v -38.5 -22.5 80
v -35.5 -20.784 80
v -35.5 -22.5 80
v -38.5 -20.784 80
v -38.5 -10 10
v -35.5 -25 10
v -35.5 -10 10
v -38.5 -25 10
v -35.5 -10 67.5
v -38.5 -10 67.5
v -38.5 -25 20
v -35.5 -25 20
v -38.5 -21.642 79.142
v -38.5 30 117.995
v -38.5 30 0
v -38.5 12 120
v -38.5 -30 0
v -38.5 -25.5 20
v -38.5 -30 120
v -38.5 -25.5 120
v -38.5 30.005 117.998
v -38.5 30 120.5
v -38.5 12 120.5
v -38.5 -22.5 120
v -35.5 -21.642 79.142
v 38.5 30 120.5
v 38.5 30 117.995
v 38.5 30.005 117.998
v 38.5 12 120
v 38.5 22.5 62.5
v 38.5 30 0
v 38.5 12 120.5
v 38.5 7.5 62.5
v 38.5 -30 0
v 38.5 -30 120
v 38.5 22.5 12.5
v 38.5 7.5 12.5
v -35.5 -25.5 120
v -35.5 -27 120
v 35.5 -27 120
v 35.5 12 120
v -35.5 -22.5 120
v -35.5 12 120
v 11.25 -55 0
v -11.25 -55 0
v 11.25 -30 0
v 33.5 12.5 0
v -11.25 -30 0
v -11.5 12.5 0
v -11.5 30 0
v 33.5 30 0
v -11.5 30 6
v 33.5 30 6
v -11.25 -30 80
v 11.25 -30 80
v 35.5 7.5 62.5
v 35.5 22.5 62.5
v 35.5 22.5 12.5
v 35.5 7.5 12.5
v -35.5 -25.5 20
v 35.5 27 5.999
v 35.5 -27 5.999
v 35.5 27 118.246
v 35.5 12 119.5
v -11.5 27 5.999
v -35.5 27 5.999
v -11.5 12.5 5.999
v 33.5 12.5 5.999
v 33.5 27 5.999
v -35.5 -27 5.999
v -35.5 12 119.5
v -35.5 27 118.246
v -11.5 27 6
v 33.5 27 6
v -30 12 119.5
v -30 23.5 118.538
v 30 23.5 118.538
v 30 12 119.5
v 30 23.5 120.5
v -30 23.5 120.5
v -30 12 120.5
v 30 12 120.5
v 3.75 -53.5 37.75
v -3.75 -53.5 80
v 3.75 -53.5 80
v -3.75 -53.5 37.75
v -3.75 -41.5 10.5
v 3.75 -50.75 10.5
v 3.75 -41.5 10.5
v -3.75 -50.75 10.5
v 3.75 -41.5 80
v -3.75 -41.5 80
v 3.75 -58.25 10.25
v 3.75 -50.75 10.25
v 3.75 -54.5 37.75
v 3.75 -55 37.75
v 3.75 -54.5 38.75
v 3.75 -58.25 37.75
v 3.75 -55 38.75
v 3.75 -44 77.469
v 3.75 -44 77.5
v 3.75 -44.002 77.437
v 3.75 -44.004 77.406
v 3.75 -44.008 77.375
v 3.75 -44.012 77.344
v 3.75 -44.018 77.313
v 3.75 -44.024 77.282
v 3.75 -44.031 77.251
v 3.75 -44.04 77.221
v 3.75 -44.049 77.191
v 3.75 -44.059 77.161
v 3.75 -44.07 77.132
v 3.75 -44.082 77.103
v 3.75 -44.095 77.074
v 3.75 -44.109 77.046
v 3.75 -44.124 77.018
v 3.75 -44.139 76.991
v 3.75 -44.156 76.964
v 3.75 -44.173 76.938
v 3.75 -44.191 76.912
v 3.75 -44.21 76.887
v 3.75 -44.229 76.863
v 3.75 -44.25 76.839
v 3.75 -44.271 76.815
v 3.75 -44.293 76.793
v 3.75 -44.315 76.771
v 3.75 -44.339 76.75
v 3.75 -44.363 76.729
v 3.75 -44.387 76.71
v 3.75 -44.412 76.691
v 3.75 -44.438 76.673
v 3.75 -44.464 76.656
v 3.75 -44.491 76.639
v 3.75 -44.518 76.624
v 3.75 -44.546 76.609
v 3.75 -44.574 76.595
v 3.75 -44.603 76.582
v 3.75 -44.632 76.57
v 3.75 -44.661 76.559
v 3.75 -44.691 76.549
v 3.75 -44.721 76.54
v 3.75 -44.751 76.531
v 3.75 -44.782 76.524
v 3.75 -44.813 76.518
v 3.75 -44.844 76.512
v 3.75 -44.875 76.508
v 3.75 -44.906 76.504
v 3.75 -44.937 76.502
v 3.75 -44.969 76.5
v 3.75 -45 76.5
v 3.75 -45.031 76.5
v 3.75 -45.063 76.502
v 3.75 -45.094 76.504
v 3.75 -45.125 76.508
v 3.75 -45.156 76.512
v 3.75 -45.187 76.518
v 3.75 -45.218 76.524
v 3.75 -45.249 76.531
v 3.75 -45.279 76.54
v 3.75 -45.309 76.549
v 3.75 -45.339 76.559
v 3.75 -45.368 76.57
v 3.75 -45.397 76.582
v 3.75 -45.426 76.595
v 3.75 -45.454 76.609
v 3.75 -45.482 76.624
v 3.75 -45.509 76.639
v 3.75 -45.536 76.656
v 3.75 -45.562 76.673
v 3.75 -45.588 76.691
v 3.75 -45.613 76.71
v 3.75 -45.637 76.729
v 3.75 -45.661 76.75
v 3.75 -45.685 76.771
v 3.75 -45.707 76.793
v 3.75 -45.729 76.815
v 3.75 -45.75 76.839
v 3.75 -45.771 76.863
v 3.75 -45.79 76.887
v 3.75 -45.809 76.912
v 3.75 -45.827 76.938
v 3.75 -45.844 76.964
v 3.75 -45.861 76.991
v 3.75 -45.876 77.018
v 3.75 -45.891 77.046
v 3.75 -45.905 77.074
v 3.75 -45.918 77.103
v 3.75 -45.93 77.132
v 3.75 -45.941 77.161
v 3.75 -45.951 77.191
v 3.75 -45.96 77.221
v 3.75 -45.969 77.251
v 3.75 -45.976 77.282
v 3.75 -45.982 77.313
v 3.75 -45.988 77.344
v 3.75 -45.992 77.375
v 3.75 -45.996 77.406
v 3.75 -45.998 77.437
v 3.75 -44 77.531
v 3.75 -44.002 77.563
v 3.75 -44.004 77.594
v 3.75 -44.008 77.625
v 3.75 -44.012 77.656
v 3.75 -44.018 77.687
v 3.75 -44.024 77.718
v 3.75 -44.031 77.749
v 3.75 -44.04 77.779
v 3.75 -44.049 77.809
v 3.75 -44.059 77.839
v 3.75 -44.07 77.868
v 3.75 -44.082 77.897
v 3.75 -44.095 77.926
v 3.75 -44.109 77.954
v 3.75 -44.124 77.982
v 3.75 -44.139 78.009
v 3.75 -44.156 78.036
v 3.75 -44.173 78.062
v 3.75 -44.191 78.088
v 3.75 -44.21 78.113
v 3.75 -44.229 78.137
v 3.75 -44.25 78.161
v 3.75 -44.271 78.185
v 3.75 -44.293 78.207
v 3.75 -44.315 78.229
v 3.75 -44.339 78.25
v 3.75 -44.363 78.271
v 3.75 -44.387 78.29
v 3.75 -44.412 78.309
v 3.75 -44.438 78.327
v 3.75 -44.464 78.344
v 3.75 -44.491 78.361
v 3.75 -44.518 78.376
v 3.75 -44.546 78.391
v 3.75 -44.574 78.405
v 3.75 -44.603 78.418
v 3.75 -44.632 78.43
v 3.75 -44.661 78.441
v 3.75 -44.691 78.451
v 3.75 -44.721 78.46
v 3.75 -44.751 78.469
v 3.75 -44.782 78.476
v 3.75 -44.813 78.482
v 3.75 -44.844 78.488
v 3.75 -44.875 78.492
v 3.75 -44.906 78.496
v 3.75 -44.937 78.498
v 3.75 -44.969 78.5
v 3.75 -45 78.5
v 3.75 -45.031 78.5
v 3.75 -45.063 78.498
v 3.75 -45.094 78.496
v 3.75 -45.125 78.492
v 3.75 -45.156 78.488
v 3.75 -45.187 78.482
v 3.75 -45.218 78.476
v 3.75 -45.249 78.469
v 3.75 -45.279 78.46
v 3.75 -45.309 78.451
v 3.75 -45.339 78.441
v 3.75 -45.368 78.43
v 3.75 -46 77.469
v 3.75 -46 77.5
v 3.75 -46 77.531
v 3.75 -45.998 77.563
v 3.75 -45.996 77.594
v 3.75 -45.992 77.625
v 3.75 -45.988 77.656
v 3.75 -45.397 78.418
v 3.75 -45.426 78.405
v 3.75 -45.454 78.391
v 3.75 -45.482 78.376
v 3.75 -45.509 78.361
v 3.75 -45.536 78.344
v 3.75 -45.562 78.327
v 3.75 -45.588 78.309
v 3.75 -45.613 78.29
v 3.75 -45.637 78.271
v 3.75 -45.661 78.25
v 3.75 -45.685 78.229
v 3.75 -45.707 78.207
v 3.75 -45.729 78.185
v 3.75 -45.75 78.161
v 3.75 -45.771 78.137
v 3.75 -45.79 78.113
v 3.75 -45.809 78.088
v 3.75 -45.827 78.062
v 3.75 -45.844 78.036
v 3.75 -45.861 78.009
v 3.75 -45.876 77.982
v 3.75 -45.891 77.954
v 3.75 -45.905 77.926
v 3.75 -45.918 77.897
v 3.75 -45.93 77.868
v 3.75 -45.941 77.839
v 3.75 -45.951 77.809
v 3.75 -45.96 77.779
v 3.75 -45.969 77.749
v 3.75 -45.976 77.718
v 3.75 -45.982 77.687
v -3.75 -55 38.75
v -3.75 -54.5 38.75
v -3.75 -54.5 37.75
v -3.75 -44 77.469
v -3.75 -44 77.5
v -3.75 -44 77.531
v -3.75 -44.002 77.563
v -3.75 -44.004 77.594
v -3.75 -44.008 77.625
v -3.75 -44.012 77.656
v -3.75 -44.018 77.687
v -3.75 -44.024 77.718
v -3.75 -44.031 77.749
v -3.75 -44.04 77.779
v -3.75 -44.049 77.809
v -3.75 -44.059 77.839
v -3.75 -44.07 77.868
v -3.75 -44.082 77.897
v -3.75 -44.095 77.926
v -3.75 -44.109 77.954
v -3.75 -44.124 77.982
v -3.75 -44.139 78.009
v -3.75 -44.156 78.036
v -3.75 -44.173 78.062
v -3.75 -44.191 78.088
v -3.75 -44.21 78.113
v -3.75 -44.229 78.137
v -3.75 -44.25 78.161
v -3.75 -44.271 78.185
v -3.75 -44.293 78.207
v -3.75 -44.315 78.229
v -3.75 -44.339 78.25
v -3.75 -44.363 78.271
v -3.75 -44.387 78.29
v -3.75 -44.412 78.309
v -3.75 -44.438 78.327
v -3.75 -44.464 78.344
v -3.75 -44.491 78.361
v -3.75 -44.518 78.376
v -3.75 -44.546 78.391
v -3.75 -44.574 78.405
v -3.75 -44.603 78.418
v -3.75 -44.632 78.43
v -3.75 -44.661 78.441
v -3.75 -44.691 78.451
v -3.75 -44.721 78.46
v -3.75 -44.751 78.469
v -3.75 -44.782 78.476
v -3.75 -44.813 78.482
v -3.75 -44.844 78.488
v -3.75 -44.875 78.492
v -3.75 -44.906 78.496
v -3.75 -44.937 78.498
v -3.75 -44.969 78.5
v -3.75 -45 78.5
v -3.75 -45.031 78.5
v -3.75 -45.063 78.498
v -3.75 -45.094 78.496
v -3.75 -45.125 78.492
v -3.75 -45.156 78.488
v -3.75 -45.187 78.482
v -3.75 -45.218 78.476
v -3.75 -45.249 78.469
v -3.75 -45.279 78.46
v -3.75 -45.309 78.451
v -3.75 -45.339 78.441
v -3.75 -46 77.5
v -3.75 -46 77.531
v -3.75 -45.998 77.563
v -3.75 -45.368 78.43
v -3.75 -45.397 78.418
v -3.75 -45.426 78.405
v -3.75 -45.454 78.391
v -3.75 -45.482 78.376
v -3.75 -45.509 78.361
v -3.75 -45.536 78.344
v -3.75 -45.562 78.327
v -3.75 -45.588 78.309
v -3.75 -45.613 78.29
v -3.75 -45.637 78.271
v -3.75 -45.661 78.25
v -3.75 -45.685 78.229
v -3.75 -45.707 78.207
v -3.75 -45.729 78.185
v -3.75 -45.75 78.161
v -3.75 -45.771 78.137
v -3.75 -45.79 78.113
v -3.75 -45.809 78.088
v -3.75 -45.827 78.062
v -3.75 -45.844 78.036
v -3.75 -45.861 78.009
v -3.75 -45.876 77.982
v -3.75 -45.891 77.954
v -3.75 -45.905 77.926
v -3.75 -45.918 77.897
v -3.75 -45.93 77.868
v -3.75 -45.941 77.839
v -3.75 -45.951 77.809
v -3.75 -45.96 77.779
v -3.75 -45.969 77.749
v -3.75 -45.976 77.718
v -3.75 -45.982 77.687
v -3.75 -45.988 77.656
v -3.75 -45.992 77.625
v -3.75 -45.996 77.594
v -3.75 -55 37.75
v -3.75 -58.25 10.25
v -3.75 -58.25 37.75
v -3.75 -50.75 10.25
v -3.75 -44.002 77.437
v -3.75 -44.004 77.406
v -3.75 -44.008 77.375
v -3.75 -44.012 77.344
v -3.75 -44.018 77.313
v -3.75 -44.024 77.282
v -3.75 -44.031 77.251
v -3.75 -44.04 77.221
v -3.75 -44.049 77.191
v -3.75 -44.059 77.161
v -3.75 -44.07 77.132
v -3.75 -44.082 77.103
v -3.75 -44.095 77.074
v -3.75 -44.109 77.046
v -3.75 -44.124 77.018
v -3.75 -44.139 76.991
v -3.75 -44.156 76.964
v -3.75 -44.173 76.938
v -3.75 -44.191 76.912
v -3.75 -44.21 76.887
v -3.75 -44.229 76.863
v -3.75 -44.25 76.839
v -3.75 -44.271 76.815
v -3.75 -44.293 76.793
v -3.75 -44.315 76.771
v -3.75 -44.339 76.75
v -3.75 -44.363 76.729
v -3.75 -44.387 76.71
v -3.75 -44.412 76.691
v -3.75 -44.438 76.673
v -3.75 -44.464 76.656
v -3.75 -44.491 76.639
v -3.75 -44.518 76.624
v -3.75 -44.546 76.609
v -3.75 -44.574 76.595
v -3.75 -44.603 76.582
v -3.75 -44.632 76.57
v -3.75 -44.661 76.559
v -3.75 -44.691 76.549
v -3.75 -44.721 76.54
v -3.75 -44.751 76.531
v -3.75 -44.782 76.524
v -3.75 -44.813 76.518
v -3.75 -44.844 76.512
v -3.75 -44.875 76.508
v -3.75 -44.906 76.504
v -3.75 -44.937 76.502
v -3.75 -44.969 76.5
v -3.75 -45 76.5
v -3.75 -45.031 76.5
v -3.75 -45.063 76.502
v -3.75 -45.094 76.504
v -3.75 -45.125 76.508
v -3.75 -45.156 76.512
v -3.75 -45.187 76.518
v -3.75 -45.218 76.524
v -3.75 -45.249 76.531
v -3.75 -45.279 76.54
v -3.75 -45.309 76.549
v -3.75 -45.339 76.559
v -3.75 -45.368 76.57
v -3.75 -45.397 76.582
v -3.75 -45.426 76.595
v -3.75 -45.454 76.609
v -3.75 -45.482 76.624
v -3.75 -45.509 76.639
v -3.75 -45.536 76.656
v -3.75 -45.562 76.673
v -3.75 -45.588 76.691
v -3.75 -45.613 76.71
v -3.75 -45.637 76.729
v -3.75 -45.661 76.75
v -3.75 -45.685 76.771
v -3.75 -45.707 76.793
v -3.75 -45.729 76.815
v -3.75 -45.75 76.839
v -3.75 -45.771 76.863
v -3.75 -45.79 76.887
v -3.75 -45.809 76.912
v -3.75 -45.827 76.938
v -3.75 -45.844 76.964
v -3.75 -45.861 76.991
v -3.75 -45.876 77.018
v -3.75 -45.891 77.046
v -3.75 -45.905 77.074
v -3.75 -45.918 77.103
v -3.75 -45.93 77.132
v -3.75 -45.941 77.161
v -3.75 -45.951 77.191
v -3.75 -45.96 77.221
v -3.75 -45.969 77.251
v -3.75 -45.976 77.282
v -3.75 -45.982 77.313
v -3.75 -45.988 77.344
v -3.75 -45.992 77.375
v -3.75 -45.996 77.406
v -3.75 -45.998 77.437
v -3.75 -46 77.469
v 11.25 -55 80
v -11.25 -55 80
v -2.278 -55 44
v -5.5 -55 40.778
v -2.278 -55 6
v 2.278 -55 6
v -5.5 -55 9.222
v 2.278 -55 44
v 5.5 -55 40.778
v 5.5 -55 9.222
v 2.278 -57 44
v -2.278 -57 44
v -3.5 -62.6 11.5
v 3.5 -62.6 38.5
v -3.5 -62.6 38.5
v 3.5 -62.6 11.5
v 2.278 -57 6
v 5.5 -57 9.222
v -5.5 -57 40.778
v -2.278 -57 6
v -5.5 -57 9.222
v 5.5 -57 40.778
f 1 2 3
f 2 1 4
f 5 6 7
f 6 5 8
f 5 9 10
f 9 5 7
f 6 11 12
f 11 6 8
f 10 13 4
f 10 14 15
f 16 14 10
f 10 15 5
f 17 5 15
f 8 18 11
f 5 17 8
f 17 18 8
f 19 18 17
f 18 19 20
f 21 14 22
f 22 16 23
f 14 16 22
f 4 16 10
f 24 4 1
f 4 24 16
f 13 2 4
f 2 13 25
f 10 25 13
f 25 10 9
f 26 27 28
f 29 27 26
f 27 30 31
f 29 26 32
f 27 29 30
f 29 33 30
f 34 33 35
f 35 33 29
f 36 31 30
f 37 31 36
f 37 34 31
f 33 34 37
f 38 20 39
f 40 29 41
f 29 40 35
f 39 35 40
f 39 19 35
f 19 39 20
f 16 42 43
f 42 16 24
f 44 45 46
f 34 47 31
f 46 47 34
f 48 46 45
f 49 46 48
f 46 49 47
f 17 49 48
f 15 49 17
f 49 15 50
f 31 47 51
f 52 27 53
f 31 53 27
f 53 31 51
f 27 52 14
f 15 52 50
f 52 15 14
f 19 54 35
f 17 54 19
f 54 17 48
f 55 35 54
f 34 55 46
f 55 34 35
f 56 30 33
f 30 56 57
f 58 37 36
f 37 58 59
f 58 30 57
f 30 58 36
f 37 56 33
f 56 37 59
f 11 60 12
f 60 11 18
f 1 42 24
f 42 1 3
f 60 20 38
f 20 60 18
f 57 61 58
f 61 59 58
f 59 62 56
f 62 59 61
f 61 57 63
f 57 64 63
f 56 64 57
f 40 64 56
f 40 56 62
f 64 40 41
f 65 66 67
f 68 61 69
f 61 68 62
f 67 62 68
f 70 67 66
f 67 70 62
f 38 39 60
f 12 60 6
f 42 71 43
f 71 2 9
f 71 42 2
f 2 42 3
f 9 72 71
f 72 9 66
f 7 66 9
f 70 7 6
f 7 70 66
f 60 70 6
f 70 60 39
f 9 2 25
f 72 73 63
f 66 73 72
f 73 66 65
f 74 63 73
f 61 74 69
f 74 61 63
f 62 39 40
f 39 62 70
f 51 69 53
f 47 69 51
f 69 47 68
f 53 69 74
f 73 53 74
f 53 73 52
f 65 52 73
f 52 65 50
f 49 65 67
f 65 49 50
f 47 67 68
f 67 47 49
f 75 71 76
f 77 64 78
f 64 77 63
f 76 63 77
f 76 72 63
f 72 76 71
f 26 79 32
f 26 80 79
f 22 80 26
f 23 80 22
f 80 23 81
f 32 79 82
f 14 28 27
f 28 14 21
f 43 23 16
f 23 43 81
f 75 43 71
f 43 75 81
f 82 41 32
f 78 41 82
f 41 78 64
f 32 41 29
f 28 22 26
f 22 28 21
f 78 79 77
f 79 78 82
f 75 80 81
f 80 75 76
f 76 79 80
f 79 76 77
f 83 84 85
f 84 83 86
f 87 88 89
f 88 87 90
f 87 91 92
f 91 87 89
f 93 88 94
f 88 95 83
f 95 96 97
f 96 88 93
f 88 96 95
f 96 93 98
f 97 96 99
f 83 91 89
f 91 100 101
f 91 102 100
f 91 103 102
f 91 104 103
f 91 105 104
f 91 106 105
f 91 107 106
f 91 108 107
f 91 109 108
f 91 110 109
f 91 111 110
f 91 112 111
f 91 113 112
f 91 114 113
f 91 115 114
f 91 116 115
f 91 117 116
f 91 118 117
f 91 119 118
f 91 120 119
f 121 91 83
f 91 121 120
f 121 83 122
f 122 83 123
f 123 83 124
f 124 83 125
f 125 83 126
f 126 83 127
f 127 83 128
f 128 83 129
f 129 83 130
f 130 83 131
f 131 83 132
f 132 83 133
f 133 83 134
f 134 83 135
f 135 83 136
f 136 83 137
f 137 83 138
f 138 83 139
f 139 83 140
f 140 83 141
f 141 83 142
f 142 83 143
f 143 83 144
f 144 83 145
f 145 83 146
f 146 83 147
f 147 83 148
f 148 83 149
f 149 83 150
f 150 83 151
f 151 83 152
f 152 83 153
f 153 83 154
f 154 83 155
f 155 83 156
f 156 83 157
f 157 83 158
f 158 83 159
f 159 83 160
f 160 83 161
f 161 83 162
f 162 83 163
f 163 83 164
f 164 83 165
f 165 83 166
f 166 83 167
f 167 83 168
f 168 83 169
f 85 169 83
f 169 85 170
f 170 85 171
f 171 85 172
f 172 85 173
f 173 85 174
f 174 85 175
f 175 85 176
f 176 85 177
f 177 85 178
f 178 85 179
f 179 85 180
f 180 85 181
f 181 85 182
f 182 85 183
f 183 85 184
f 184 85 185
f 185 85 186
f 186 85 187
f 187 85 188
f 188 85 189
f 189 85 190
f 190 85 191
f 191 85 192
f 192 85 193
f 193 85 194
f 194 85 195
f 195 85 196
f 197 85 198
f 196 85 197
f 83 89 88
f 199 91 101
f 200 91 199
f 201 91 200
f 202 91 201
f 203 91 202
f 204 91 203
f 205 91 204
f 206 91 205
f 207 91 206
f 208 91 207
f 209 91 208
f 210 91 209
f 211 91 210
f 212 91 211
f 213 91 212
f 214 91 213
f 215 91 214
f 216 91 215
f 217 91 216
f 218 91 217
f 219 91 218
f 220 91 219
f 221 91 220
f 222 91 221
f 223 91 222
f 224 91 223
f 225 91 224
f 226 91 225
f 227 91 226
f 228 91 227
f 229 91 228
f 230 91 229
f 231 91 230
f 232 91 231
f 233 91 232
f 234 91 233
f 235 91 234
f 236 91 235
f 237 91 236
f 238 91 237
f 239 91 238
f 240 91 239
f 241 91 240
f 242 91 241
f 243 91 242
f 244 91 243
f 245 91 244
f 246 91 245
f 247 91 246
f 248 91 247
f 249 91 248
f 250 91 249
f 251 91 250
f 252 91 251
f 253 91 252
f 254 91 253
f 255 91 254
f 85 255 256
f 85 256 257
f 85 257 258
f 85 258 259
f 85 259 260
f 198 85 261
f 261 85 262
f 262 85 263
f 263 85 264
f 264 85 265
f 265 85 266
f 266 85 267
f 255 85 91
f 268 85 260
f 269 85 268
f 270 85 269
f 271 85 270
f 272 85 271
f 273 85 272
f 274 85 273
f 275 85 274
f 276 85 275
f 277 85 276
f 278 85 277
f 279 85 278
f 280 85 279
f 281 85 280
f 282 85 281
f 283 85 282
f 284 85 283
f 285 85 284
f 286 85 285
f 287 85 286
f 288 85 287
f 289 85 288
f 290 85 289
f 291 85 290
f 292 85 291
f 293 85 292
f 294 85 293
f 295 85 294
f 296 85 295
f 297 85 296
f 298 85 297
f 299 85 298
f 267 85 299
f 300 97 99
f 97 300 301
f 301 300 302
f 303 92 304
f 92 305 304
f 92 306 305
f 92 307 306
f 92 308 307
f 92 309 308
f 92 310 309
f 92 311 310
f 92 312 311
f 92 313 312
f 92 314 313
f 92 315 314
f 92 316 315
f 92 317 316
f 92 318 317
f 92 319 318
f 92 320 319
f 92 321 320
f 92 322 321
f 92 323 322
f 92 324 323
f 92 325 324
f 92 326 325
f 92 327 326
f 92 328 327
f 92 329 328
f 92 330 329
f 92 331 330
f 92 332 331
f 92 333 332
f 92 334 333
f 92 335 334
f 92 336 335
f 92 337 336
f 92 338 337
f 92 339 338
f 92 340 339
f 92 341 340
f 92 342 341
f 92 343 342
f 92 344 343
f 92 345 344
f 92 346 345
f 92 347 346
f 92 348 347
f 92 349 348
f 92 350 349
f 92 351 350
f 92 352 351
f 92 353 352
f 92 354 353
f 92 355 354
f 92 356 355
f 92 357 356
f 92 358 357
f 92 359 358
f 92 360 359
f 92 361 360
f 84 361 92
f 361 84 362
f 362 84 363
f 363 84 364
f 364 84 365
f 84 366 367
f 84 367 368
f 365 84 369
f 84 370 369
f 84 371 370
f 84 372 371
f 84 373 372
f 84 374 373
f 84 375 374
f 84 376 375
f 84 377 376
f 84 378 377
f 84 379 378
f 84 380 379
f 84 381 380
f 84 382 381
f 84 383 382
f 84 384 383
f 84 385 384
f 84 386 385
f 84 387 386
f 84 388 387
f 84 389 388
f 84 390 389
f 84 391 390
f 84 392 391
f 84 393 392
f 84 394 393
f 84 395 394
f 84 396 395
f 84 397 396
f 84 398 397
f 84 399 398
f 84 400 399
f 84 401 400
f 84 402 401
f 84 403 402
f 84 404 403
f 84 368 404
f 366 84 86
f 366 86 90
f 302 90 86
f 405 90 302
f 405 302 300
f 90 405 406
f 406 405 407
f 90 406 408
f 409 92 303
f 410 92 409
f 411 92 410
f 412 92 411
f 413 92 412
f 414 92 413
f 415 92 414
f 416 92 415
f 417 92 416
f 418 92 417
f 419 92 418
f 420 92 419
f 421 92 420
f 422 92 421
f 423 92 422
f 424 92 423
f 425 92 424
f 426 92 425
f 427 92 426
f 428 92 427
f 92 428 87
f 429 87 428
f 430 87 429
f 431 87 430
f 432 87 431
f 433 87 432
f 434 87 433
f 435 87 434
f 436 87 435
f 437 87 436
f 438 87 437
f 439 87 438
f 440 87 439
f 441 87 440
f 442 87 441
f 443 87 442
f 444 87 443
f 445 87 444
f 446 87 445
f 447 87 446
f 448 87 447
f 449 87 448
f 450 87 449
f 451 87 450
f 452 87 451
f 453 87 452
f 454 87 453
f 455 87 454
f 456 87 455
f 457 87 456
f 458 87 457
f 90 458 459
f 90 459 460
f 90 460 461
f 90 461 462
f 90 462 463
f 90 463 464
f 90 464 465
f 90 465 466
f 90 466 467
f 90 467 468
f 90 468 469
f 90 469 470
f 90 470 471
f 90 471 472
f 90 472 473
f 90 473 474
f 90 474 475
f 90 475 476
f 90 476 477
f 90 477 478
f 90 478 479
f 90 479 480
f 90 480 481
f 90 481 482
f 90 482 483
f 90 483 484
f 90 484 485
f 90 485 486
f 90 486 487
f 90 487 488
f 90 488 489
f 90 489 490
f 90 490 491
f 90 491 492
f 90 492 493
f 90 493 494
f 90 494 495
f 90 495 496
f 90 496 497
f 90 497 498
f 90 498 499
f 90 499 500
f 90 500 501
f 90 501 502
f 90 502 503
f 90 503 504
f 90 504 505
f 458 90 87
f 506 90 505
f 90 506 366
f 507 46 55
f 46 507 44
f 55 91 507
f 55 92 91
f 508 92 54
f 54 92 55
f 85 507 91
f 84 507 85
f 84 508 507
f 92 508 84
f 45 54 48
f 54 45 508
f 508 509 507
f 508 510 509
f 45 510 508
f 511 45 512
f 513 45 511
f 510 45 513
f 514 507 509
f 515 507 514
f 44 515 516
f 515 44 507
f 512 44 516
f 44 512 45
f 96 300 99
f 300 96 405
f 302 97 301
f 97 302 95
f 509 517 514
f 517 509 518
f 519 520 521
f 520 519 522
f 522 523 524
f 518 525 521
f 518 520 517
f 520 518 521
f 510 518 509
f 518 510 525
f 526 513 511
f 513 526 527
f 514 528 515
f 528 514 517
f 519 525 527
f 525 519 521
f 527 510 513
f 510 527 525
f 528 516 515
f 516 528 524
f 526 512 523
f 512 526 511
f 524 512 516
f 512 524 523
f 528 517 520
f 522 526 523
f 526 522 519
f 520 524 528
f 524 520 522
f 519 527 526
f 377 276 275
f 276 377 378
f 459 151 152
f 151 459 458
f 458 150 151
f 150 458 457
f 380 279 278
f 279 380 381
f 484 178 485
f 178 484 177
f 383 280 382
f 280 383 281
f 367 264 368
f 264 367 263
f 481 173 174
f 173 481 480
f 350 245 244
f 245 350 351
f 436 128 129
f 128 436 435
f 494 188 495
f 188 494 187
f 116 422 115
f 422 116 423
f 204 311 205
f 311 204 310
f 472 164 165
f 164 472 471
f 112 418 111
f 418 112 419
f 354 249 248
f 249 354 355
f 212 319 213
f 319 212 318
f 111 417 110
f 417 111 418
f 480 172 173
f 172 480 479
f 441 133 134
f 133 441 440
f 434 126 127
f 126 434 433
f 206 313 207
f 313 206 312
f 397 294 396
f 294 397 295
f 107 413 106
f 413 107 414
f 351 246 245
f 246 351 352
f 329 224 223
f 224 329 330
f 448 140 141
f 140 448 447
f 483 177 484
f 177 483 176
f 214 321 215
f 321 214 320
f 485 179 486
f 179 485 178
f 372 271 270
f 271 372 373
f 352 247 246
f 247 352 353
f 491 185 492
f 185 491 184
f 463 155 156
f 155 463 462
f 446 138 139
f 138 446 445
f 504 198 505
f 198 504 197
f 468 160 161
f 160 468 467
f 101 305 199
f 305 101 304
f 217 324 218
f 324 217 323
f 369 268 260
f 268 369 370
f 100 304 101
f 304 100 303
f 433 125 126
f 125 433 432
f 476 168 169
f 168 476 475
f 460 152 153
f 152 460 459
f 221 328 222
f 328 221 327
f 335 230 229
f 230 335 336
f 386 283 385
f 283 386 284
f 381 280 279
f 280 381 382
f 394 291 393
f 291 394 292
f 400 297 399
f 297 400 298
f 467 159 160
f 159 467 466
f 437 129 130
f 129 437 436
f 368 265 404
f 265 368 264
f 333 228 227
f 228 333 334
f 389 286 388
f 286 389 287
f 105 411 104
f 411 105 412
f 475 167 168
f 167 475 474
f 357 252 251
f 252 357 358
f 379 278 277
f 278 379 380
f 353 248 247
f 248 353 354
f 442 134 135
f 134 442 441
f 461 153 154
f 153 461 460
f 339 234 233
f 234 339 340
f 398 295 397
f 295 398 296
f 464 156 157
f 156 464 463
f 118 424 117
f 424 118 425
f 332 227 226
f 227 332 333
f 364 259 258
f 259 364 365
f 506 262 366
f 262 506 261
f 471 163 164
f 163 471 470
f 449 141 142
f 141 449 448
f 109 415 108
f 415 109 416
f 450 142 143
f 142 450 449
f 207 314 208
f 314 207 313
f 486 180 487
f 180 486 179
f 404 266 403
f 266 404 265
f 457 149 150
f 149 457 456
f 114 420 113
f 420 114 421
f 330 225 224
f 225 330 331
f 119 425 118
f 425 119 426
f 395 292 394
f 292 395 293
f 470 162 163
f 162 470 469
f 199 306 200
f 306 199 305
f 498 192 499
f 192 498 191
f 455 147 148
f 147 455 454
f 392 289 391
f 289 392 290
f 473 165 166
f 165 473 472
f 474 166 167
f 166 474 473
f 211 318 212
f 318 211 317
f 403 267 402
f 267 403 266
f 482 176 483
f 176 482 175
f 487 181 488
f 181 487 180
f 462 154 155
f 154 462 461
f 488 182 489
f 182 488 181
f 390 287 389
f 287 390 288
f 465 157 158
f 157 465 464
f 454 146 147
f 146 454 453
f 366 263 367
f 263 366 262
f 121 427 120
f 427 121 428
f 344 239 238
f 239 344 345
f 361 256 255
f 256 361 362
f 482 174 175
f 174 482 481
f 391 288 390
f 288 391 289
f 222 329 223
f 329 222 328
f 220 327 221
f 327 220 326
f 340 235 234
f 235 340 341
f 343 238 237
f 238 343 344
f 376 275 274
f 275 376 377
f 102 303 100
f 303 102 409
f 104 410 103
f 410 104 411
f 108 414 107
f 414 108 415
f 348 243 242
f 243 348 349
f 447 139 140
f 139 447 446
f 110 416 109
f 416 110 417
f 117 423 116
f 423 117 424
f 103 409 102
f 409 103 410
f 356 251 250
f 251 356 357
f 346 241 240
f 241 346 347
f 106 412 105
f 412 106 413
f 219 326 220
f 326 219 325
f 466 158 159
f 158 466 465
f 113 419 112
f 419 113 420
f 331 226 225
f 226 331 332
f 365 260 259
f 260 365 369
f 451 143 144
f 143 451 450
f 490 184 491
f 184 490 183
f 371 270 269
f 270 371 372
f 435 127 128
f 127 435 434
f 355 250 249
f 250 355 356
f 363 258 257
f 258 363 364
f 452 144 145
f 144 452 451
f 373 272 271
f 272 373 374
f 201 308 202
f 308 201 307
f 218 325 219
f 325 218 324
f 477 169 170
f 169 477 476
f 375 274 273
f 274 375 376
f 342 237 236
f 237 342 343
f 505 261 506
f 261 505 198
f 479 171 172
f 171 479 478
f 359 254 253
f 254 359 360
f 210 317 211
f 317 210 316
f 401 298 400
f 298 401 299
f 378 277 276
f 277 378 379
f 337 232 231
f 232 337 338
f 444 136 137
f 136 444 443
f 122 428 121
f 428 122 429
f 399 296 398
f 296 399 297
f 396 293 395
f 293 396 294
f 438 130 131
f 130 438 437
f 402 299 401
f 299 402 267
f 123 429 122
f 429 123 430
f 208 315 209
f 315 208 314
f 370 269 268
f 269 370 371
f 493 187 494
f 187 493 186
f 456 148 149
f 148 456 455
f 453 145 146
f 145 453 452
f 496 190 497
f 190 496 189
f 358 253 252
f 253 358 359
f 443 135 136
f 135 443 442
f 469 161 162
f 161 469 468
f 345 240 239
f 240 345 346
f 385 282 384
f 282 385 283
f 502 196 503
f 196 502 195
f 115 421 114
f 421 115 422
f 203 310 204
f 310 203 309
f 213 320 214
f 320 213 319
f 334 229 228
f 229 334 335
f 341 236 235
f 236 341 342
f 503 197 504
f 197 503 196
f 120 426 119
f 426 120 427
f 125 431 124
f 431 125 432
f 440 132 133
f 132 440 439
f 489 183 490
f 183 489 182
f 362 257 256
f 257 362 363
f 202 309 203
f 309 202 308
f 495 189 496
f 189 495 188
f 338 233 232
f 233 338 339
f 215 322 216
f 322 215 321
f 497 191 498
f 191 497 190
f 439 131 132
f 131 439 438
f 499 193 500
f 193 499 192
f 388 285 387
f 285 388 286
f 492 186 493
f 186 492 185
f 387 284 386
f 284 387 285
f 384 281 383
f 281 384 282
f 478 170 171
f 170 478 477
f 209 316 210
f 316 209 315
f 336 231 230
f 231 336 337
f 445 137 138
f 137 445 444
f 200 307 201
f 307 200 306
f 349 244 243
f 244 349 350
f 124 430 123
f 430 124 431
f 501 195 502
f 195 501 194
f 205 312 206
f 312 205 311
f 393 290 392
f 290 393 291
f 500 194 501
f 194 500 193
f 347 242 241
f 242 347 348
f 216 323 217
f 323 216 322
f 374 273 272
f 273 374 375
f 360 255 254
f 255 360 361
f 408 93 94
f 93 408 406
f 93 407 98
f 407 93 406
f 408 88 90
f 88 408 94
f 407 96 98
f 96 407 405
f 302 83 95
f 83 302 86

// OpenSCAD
// file: notched_attachment.scad
/*
//does not go to 116 or higher
sb_hight = 80; 
//dont make this longer its a waist of filament.:
sb_width = 40;
sb_length = 55;*/

notch_mating_gap = 0.0;

notch_rim_radius = 5.5 + notch_mating_gap;
notch_rim_height = 2 + notch_mating_gap;

notch_tip_length = 27 + notch_mating_gap;
notch_tip_width = 7 + notch_mating_gap;
notch_tip_height = 7.6 + notch_mating_gap;

magnet_length = 27.5;
magnet_width = 7.5;
magnet_hight = magnet_width;

module female_atachment_notch(sb_hight = 80,sb_width = 40,sb_length = 55) {
  hull(){
    translate([notch_tip_length/2, 0, notch_rim_height/2]) rotate([0, 0, 360/16])
      cylinder(h = notch_rim_height, r = notch_rim_radius / cos(360/16), $fn = 8, center = true);
    translate([notch_tip_length/-2, 0, notch_rim_height/2]) rotate([0, 0, 360/16])
      cylinder(h = notch_rim_height, r = notch_rim_radius / cos(360/16), $fn = 8, center = true);
    translate([0, 0, notch_tip_height/2])
      cube([notch_tip_length, notch_tip_width, notch_tip_height], center = true);
  }
}

module magnet(){
    cube([magnet_length,magnet_width,magnet_hight],center = true);
}

module spacing_box (sb_hight = 80,sb_width = 40,sb_length = 55
){

    
    difference(){
        translate([0,0,sb_hight/2])
            cube([sb_length,
                  sb_width,
                  sb_hight],center = true);
    union(){
        translate([0,-40,30])
           rotate([0,90,270])
               translate([-15,0,magnet_hight-2])
                   magnet();
        
        translate([0,-sb_width/2 + magnet_width*2 -2, sb_hight/10 +25])
             rotate([0,0,270])
                 translate([5.5,0,magnet_hight+10])
        
                     cube([magnet_width*2 -3,magnet_width+2,sb_hight ],center = true);
            
        translate([0,-sb_width/2 +2,25])
            cube([magnet_hight,magnet_width,magnet_length], center = true);
        
        }
    }
}




module atachment_notch(sb_hight = 80,sb_width = 40,sb_length = 55, 
) {
  difference(){
      union(){
      translate([sb_hight/2-20,0,-7])  
          rotate([-90,0,90])  
              spacing_box(sb_hight,sb_width,sb_length);
        
          hull(){
            translate([sb_hight/2 - 45,0,sb_width/2 - 7]){
              translate([notch_tip_length/2, 0, notch_rim_height/2]) rotate([0, 0, 360/16])
                cylinder(h = notch_rim_height, r = notch_rim_radius / cos(360/16), $fn = 8, center = true);
              translate([notch_tip_length/-2, 0, notch_rim_height/2]) rotate([0, 0, 360/16])
                cylinder(h = notch_rim_height, r = notch_rim_radius / cos(360/16), $fn = 8, center = true);
              translate([0, 0, notch_tip_height/2])
                cube([notch_tip_length, notch_tip_width, notch_tip_height], center = true);
                
            }
        }
     
            translate([-sb_hight/2 - 17.5,4.5,sb_width/2 - 17])
                rotate([90,0,0])
                    cylinder(r=1 , h= 9 , $fn = 200);
        
        difference(){
        
            
        
          translate([-20,0,sb_width/2 - 15])
            cube([sb_hight,magnet_width+2,magnet_hight*2],center = true);
        
          translate([0,-0,sb_width/2 - 16])
            cube([magnet_length*300,magnet_width,magnet_hight*2],center = true);
        
        }
        }
translate([sb_width/2-16.5,0,sb_width/2-7.5])
            cube([magnet_length,magnet_width,magnet_hight], center = true);
}
}

/*
atachment_notch (sb_hight = 90,sb_width = 33,sb_length = 55);
//*/
// main file
include<notched_attachment.scad>;

pi_box_hight = 120; 
pi_box_width = 60;
pi_box_length = 77;
//does not go to 116 or higher
spacer_box_hight = 80; 
//dont make this longer its a waist of filament.scad:
spacer_box_width = 25;
spacer_box_length = 22.5;

usb_cutout_hight = 50;
usb_cutout_width = 15;
usb_cutout_length = 55;

wall_width = 3;

floor_hight = 6;


module pi_box (){
    difference(){
      union(){
        translate([0,0,pi_box_hight/2])
          cube([pi_box_length,pi_box_width,pi_box_hight],center = true);
      

    }
      translate([pi_box_length/2,15,37.5])
        cube([usb_cutout_length,usb_cutout_width,usb_cutout_hight],center = true);
      
      translate([0,-pi_box_width/2 + 32.5,0])
      union(){
      difference(){    
      translate([-pi_box_length/2 ,-pi_box_width/2 + pi_box_width/2 - 20,45])
        cube([usb_cutout_length,usb_cutout_width,usb_cutout_hight+20],center = true);
          
      translate([-pi_box_length/2,-pi_box_width/2 + pi_box_width/2 - 10,65])
      rotate([45,0,0])
      cube([20,40,20]);
      }}
      translate([-pi_box_length/2 ,-pi_box_width/2 + 6,120])
        cube([50,3,200],center = true);

      translate([0,0,pi_box_hight/2 + floor_hight])
        cube([pi_box_length-wall_width*2 + 0.001, pi_box_width-wall_width*2 + 0.001, pi_box_hight + 0.001] , center = true);
    
      translate([0,-10,pi_box_hight-3])
        cube([pi_box_length - wall_width*2,29.3333333333333,7],center = true);
    
        translate([pi_box_length/2-27.5,pi_box_width/2-5,0])  
          cube([usb_cutout_length/2+17.5,usb_cutout_width+10,floor_hight*2-0],center = true);
      
      }

      difference(){
      hull(){
      
      
        translate([0,pi_box_width/2 - 9,pi_box_hight])
          cube([pi_box_length,18,1],center = true);
    
    translate([-spacer_box_length - 16 ,pi_box_width/2 ,pi_box_hight-2])
          rotate([0,90,0])
    cylinder(h=pi_box_length,r = 0.005);
    
    }

    translate([0,pi_box_width/2 - 14,pi_box_hight-5])
        cube([pi_box_width/2+30,usb_cutout_width,usb_cutout_hight-0],center = true);
    
    }

}







union(){
pi_box();


translate([0,-pi_box_width/2 - spacer_box_width/2 -7 ,spacer_box_hight/2 - 20])
    rotate([0,90,270])
        atachment_notch(spacer_box_hight,spacer_box_width,spacer_box_length);
}
